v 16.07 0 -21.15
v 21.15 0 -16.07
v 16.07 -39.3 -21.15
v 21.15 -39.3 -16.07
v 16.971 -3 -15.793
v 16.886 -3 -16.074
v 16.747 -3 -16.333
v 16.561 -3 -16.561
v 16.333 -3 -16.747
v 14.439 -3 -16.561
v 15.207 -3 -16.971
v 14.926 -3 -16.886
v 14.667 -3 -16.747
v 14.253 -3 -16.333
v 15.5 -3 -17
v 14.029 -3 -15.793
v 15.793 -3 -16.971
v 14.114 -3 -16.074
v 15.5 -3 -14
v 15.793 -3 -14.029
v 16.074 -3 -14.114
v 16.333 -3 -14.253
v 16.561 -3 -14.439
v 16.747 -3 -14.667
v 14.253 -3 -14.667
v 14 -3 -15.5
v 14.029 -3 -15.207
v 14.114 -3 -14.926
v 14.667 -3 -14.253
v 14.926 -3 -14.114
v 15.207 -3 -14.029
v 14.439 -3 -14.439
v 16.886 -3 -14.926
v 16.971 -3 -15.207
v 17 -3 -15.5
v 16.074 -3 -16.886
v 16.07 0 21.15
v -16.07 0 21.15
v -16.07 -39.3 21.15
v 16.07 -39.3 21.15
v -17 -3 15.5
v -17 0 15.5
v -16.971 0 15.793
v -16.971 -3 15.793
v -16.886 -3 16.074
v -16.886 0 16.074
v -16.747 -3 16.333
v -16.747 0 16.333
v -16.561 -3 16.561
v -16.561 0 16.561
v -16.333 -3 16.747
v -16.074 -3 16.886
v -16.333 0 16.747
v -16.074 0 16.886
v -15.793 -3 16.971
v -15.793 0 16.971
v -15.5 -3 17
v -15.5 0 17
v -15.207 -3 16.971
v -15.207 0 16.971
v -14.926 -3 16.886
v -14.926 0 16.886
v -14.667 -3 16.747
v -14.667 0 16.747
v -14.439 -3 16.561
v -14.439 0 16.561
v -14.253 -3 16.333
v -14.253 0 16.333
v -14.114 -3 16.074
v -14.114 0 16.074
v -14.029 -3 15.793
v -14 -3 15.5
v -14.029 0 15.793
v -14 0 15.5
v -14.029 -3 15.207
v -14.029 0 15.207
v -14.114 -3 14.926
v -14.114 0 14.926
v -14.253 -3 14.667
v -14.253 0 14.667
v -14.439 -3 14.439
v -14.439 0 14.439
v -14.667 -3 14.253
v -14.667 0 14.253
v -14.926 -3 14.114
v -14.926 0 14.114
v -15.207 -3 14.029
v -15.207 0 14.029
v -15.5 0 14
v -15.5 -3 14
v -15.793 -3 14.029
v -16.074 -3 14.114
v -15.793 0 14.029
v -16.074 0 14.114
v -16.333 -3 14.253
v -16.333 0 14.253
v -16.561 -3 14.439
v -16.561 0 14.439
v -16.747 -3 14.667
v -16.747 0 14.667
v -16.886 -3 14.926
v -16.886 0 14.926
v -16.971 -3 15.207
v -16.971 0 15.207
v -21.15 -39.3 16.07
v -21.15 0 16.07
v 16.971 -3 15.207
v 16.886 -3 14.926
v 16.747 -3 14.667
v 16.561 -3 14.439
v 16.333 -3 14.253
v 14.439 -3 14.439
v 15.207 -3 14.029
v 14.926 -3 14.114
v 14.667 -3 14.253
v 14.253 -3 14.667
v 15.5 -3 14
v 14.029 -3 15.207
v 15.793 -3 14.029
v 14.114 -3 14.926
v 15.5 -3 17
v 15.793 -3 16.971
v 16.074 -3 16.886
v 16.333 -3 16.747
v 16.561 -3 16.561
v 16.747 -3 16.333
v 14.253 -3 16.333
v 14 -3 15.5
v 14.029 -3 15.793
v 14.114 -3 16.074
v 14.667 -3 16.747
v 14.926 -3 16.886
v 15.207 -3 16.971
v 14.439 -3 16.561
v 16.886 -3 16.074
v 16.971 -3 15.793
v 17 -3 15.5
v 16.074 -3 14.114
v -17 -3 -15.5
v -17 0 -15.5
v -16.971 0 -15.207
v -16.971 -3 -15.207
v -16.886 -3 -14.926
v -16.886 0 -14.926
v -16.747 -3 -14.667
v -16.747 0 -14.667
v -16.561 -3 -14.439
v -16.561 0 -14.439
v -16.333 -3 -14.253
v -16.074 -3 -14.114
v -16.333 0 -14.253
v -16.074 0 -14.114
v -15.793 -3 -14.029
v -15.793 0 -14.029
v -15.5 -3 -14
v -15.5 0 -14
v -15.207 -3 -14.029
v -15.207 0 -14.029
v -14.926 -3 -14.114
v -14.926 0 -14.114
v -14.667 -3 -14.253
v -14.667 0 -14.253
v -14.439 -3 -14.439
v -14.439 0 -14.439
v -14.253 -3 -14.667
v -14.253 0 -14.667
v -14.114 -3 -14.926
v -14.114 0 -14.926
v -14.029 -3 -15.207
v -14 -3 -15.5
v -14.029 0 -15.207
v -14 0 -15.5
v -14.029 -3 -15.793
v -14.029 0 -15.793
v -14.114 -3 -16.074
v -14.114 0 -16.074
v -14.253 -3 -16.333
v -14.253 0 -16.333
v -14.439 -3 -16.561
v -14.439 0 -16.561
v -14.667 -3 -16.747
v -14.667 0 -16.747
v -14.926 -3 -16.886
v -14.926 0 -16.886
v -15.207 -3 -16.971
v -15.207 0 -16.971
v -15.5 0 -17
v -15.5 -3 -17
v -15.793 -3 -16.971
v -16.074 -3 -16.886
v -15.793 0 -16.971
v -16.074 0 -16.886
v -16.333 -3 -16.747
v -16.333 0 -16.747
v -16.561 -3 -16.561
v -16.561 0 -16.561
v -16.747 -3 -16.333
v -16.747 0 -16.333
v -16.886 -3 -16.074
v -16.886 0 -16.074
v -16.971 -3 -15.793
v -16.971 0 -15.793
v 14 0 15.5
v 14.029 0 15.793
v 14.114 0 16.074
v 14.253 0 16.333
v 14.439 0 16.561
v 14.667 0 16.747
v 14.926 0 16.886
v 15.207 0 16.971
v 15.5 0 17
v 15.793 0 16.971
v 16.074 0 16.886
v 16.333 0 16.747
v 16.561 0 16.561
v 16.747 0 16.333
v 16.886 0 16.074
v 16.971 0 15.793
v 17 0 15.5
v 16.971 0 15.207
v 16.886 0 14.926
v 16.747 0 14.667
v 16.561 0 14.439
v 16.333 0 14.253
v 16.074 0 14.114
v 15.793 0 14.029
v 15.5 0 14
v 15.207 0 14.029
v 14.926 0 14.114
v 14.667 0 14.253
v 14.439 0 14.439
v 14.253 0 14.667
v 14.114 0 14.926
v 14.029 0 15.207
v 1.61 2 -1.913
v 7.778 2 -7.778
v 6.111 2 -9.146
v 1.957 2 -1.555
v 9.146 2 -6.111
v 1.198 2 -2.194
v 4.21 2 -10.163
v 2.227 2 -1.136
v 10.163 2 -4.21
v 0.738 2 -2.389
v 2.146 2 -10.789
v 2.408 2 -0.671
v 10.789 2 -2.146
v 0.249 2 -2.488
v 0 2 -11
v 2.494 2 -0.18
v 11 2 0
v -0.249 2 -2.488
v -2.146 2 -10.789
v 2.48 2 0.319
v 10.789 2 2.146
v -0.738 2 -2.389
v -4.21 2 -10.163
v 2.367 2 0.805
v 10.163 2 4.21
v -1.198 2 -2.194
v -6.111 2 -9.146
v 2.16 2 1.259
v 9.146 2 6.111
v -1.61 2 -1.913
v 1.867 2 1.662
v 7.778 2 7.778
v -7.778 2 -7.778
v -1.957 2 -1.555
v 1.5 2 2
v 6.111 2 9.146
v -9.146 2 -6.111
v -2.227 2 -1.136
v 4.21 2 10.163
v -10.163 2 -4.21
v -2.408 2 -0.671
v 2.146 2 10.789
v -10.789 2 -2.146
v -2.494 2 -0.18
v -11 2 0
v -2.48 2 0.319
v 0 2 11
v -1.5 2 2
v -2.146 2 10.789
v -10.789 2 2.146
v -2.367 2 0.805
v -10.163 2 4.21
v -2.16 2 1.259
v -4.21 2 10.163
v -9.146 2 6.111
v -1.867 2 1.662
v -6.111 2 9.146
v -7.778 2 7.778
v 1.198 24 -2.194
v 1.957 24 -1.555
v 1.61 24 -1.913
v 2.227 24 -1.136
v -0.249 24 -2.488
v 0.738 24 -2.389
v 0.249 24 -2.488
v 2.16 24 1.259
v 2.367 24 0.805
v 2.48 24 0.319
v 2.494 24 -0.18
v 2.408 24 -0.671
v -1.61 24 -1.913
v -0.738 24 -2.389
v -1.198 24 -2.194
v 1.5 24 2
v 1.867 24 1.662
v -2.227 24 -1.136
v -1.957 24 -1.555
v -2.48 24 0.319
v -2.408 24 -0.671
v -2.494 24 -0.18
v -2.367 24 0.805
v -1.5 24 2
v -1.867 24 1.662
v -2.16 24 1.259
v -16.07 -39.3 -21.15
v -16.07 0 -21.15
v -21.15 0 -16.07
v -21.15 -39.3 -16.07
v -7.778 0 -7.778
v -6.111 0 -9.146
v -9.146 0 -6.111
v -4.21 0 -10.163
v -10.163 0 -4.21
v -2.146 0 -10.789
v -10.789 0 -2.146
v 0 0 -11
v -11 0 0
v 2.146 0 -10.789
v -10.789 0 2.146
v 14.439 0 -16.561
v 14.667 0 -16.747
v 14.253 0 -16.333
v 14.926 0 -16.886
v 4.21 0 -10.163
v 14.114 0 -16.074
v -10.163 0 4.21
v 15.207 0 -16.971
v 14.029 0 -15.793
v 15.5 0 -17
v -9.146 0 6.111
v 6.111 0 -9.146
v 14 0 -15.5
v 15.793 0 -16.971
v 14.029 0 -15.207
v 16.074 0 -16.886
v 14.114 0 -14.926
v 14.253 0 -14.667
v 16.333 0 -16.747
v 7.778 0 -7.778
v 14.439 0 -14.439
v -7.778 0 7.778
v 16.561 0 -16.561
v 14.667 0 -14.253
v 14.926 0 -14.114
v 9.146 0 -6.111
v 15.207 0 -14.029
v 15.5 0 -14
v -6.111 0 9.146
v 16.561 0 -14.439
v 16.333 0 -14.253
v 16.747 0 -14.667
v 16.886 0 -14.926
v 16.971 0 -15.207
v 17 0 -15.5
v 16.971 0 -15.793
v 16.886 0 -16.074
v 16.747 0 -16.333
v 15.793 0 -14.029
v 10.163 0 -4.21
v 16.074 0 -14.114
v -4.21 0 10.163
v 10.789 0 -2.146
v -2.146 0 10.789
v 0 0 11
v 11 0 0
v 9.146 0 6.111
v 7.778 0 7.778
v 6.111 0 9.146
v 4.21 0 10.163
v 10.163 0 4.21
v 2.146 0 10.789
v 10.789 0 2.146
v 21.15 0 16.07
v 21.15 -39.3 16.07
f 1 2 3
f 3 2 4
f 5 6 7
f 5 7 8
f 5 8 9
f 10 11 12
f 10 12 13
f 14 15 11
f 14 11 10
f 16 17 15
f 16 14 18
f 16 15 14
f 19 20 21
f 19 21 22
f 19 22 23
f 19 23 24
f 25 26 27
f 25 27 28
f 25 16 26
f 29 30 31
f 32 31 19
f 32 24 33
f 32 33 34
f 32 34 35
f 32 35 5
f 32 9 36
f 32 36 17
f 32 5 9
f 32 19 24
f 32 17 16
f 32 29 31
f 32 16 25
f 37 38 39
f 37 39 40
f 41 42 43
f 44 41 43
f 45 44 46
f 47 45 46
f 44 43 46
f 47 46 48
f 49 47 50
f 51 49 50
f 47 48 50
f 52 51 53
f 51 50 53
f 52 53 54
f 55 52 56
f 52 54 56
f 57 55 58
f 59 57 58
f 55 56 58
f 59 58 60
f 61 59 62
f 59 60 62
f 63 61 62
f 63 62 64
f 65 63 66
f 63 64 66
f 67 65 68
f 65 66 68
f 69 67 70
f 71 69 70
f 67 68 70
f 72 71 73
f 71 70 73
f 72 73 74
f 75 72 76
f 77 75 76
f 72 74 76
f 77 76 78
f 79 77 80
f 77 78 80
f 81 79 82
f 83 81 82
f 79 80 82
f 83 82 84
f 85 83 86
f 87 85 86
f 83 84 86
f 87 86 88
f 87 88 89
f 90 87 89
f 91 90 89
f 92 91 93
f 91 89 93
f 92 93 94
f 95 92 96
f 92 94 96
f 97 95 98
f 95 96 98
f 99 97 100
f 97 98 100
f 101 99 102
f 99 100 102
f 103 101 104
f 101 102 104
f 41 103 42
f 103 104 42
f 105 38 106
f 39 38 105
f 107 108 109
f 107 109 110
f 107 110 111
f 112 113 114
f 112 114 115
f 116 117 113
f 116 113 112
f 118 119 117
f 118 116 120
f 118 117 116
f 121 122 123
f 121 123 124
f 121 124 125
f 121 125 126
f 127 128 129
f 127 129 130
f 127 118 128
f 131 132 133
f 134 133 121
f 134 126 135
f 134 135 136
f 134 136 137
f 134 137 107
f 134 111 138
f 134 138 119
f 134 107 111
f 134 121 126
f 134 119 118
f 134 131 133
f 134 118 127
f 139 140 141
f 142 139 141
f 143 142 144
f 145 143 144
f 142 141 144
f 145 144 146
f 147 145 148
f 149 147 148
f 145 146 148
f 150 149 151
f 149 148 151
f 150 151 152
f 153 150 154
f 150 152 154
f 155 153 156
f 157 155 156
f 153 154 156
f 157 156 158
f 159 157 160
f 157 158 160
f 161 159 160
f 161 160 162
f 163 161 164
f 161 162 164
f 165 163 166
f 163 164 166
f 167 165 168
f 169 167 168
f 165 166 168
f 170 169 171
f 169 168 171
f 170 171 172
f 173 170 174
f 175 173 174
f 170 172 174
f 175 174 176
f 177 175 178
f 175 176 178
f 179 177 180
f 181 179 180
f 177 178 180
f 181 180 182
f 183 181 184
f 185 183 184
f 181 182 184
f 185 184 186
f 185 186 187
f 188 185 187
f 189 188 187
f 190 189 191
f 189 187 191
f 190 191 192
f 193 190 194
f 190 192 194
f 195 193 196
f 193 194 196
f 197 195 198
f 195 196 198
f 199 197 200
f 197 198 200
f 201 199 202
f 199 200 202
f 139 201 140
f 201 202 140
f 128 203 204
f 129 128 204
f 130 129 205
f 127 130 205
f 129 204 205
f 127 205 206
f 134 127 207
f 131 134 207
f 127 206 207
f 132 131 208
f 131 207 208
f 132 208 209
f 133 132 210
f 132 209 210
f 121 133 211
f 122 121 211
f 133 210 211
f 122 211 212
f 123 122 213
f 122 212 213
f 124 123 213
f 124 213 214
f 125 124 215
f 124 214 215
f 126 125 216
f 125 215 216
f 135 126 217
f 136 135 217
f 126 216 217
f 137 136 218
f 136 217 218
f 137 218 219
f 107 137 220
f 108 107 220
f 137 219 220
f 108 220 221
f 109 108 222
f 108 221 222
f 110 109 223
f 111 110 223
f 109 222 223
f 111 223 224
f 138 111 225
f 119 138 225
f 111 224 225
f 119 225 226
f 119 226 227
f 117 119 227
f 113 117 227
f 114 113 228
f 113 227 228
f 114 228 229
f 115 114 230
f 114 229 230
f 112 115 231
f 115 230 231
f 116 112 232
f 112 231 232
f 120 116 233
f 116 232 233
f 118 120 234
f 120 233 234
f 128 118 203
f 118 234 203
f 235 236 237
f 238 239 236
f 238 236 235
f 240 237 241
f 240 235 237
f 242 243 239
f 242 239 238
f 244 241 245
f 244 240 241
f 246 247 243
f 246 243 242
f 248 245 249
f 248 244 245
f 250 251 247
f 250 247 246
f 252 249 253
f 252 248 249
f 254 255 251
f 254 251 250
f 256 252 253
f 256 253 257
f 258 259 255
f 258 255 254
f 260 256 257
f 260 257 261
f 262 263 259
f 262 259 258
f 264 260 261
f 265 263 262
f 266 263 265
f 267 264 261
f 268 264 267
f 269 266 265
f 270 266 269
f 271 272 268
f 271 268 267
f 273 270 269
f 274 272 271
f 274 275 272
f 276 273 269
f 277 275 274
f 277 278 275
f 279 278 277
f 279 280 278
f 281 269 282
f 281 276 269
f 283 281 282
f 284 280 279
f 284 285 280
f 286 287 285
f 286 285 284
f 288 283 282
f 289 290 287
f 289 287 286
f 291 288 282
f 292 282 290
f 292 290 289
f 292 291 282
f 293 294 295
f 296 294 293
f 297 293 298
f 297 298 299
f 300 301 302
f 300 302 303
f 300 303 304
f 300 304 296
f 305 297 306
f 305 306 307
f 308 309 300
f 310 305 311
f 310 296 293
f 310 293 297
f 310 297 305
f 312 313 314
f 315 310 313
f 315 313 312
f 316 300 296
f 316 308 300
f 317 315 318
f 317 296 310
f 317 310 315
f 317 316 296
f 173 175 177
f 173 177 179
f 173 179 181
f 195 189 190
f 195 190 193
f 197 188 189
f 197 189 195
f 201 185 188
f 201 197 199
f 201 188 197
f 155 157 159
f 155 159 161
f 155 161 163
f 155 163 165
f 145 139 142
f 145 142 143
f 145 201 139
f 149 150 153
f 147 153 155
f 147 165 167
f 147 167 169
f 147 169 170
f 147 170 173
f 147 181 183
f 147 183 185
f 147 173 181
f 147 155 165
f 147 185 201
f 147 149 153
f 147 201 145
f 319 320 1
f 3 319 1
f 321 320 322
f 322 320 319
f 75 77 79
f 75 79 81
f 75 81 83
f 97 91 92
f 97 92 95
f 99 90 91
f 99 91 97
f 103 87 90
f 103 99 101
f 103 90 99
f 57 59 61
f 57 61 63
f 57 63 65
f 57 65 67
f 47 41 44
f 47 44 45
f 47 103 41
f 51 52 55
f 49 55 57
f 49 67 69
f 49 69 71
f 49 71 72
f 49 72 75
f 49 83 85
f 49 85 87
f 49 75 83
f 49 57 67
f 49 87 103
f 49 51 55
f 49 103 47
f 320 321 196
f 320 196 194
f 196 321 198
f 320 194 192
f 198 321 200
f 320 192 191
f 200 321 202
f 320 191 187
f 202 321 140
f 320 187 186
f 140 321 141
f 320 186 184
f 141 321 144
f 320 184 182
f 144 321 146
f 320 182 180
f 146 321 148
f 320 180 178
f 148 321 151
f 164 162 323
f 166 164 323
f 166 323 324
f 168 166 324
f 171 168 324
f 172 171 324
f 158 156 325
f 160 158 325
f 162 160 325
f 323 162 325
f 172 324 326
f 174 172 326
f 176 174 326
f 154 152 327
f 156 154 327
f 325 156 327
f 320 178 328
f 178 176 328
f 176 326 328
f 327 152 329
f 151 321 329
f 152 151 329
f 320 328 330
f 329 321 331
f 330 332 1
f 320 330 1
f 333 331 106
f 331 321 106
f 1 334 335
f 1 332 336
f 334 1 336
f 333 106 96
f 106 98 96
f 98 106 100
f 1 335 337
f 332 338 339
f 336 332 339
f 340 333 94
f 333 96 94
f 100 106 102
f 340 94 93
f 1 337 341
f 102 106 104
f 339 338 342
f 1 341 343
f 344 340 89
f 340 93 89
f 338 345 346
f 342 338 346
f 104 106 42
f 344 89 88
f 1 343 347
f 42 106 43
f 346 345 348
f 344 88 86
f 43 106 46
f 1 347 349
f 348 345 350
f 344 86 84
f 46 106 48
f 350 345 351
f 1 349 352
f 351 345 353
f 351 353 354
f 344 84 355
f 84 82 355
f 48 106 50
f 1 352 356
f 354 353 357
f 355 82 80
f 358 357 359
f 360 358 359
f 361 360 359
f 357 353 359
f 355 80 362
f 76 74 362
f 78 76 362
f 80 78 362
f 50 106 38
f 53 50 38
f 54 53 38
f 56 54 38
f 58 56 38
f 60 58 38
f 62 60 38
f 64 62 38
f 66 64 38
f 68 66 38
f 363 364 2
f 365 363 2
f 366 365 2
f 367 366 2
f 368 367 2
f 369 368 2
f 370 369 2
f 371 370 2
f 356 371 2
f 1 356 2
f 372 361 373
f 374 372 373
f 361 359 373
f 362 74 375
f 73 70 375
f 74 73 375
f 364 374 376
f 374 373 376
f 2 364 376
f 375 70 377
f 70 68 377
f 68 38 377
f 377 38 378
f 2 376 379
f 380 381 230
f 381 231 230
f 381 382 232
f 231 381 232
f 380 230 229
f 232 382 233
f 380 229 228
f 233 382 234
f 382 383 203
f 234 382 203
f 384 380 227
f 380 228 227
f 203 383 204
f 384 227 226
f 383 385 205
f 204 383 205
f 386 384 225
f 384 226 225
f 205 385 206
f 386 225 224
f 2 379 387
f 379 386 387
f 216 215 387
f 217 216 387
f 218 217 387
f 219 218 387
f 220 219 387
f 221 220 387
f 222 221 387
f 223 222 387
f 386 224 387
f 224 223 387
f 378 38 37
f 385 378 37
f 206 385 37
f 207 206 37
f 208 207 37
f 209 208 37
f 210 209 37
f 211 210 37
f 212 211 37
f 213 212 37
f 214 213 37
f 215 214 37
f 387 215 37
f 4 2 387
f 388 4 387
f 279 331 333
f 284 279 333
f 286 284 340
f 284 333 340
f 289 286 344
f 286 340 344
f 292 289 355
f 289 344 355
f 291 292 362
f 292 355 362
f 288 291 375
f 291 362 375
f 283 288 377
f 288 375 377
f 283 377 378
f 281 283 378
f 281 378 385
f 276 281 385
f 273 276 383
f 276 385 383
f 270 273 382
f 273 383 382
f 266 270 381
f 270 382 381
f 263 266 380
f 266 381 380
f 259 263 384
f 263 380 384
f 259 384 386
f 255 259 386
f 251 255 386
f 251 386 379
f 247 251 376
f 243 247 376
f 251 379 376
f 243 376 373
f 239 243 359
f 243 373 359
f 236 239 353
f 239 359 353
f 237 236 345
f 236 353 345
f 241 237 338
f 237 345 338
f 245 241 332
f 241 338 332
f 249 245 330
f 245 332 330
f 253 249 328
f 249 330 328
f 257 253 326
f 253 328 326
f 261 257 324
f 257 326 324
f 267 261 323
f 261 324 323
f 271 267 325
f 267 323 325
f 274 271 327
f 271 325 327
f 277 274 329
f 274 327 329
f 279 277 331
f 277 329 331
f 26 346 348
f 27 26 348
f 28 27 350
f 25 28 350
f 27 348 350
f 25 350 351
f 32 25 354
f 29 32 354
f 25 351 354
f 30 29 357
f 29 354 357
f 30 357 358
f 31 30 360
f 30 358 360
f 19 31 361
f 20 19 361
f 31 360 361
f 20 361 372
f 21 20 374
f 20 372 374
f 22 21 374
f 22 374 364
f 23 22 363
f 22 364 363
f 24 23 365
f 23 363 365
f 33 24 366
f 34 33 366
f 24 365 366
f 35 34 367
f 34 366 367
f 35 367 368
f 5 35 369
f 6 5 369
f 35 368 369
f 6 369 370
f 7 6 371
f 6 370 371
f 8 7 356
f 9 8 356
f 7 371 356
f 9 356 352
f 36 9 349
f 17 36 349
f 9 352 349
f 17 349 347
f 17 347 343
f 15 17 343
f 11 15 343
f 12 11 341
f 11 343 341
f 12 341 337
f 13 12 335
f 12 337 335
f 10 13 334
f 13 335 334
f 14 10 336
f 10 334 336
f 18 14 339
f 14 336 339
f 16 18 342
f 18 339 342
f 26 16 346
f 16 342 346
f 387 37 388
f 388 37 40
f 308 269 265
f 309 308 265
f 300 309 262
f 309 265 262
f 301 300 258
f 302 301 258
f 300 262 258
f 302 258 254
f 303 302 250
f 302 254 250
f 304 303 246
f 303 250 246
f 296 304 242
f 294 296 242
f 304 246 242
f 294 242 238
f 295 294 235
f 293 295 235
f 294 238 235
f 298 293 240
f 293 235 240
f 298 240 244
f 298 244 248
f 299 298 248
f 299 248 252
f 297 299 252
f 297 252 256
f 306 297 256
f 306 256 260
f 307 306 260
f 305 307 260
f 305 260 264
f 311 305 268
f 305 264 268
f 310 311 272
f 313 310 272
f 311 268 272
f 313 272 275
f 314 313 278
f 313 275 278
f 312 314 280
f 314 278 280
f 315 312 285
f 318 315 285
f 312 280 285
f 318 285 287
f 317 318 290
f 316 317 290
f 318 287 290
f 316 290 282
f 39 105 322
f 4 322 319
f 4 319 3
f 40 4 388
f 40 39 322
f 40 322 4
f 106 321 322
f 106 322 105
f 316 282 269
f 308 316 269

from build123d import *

# Parameters (mm, degrees)
F0_W     = 42.3
F0_H     = 42.3
F1_DEPTH = 39.3
F2_SIZE  = 5.08
F3_R     = 1.5
F4_DEPTH = 3
F5_R     = 11
F6_DEPTH = 2
F8_DEPTH = 22


with BuildPart() as f1:
    # F0 (on Front) → F1 (new body)
    with BuildSketch(Plane.XZ):
        Rectangle(F0_W, F0_H)
    extrude(amount=F1_DEPTH)

    # F2
    f2_edges = [f1.edges().sort_by_distance(p)[0] for p in [
        (-21.15, -19.65, 21.15),
        (21.15, -19.65, 21.15),
        (21.15, -19.65, -21.15),
        (-21.15, -19.65, -21.15),
    ]]
    chamfer(f2_edges, length=F2_SIZE)

    # F3 (on face) → F4 (cut)
    with BuildSketch(Plane(origin=(0, 0, 0), x_dir=(-1, 0, 0), z_dir=(0, 1, 0))):
        with Locations((-15.5, 15.5)):
            Circle(F3_R)
        with Locations((15.5, 15.5)):
            Circle(F3_R)
        with Locations((15.5, -15.5)):
            Circle(F3_R)
        with Locations((-15.5, -15.5)):
            Circle(F3_R)
    extrude(amount=-F4_DEPTH, mode=Mode.SUBTRACT)

    # F5 (on face) → F6 (join)
    with BuildSketch(Plane(origin=(0, 0, 0), x_dir=(-1, 0, 0), z_dir=(0, 1, 0))):
        Circle(F5_R)
    extrude(amount=F6_DEPTH)

    # F7 (on face) → F8 (join)
    with BuildSketch(Plane(origin=(0, 2, 0), x_dir=(-1, 0, 0), z_dir=(0, 1, 0))):
        with BuildLine():
            Line((1.5, 2), (-1.5, 2))
            ThreePointArc((-1.5, 2), (0, -2.5), (1.5, 2))
        make_face()
    extrude(amount=F8_DEPTH)


solid = f1.part
